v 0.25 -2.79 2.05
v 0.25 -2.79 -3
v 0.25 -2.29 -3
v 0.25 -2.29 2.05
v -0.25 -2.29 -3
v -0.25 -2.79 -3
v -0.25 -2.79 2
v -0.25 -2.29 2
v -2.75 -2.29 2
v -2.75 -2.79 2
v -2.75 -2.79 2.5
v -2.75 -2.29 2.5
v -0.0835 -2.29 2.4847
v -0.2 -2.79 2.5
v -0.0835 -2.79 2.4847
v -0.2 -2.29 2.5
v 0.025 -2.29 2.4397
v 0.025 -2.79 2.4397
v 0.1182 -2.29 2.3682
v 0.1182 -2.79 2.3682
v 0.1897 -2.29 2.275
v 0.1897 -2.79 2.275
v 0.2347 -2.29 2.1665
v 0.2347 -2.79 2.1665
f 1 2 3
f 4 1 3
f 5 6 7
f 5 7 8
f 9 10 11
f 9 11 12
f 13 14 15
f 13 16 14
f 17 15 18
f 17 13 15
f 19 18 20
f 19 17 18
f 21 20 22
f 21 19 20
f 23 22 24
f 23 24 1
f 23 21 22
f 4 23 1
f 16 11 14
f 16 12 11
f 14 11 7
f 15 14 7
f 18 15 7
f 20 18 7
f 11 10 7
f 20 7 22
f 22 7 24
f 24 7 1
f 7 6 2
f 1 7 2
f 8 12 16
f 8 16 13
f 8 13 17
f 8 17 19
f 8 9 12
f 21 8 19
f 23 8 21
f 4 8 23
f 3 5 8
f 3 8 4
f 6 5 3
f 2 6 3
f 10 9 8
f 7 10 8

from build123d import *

# Parameters (mm, degrees)
BOX018_W     = 3
BOX018_H     = 0.5
BOX018_DEPTH = 0.5
BOX015_W     = 0.5
BOX015_H     = 0.5
BOX015_DEPTH = 5.5
FILLET007_R  = 0.45


with BuildPart() as kub018:
    # Box018 → Box018 (new body)
    with BuildSketch(Plane(origin=(-2.75, -2.79, 2), x_dir=(1, 0, 0), z_dir=(0, 0, 1))):
        with Locations((1.5, 0.25)):
            Rectangle(BOX018_W, BOX018_H)
    extrude(amount=BOX018_DEPTH)


with BuildPart() as fillet007:
    # Box015 → Box015 (new body)
    with BuildSketch(Plane(origin=(-0.25, -2.79, -3), x_dir=(1, 0, 0), z_dir=(0, 0, 1))):
        with Locations((0.25, 0.25)):
            Rectangle(BOX015_W, BOX015_H)
    extrude(amount=BOX015_DEPTH)

    # Fusion004: union Kub018
    add(kub018.part)

    # Fillet007
    fillet007_edges = [fillet007.edges().sort_by_distance(p)[0] for p in [
        (0.25, -2.54, 2.5),
    ]]
    fillet(fillet007_edges, radius=FILLET007_R)


solid = fillet007.part
